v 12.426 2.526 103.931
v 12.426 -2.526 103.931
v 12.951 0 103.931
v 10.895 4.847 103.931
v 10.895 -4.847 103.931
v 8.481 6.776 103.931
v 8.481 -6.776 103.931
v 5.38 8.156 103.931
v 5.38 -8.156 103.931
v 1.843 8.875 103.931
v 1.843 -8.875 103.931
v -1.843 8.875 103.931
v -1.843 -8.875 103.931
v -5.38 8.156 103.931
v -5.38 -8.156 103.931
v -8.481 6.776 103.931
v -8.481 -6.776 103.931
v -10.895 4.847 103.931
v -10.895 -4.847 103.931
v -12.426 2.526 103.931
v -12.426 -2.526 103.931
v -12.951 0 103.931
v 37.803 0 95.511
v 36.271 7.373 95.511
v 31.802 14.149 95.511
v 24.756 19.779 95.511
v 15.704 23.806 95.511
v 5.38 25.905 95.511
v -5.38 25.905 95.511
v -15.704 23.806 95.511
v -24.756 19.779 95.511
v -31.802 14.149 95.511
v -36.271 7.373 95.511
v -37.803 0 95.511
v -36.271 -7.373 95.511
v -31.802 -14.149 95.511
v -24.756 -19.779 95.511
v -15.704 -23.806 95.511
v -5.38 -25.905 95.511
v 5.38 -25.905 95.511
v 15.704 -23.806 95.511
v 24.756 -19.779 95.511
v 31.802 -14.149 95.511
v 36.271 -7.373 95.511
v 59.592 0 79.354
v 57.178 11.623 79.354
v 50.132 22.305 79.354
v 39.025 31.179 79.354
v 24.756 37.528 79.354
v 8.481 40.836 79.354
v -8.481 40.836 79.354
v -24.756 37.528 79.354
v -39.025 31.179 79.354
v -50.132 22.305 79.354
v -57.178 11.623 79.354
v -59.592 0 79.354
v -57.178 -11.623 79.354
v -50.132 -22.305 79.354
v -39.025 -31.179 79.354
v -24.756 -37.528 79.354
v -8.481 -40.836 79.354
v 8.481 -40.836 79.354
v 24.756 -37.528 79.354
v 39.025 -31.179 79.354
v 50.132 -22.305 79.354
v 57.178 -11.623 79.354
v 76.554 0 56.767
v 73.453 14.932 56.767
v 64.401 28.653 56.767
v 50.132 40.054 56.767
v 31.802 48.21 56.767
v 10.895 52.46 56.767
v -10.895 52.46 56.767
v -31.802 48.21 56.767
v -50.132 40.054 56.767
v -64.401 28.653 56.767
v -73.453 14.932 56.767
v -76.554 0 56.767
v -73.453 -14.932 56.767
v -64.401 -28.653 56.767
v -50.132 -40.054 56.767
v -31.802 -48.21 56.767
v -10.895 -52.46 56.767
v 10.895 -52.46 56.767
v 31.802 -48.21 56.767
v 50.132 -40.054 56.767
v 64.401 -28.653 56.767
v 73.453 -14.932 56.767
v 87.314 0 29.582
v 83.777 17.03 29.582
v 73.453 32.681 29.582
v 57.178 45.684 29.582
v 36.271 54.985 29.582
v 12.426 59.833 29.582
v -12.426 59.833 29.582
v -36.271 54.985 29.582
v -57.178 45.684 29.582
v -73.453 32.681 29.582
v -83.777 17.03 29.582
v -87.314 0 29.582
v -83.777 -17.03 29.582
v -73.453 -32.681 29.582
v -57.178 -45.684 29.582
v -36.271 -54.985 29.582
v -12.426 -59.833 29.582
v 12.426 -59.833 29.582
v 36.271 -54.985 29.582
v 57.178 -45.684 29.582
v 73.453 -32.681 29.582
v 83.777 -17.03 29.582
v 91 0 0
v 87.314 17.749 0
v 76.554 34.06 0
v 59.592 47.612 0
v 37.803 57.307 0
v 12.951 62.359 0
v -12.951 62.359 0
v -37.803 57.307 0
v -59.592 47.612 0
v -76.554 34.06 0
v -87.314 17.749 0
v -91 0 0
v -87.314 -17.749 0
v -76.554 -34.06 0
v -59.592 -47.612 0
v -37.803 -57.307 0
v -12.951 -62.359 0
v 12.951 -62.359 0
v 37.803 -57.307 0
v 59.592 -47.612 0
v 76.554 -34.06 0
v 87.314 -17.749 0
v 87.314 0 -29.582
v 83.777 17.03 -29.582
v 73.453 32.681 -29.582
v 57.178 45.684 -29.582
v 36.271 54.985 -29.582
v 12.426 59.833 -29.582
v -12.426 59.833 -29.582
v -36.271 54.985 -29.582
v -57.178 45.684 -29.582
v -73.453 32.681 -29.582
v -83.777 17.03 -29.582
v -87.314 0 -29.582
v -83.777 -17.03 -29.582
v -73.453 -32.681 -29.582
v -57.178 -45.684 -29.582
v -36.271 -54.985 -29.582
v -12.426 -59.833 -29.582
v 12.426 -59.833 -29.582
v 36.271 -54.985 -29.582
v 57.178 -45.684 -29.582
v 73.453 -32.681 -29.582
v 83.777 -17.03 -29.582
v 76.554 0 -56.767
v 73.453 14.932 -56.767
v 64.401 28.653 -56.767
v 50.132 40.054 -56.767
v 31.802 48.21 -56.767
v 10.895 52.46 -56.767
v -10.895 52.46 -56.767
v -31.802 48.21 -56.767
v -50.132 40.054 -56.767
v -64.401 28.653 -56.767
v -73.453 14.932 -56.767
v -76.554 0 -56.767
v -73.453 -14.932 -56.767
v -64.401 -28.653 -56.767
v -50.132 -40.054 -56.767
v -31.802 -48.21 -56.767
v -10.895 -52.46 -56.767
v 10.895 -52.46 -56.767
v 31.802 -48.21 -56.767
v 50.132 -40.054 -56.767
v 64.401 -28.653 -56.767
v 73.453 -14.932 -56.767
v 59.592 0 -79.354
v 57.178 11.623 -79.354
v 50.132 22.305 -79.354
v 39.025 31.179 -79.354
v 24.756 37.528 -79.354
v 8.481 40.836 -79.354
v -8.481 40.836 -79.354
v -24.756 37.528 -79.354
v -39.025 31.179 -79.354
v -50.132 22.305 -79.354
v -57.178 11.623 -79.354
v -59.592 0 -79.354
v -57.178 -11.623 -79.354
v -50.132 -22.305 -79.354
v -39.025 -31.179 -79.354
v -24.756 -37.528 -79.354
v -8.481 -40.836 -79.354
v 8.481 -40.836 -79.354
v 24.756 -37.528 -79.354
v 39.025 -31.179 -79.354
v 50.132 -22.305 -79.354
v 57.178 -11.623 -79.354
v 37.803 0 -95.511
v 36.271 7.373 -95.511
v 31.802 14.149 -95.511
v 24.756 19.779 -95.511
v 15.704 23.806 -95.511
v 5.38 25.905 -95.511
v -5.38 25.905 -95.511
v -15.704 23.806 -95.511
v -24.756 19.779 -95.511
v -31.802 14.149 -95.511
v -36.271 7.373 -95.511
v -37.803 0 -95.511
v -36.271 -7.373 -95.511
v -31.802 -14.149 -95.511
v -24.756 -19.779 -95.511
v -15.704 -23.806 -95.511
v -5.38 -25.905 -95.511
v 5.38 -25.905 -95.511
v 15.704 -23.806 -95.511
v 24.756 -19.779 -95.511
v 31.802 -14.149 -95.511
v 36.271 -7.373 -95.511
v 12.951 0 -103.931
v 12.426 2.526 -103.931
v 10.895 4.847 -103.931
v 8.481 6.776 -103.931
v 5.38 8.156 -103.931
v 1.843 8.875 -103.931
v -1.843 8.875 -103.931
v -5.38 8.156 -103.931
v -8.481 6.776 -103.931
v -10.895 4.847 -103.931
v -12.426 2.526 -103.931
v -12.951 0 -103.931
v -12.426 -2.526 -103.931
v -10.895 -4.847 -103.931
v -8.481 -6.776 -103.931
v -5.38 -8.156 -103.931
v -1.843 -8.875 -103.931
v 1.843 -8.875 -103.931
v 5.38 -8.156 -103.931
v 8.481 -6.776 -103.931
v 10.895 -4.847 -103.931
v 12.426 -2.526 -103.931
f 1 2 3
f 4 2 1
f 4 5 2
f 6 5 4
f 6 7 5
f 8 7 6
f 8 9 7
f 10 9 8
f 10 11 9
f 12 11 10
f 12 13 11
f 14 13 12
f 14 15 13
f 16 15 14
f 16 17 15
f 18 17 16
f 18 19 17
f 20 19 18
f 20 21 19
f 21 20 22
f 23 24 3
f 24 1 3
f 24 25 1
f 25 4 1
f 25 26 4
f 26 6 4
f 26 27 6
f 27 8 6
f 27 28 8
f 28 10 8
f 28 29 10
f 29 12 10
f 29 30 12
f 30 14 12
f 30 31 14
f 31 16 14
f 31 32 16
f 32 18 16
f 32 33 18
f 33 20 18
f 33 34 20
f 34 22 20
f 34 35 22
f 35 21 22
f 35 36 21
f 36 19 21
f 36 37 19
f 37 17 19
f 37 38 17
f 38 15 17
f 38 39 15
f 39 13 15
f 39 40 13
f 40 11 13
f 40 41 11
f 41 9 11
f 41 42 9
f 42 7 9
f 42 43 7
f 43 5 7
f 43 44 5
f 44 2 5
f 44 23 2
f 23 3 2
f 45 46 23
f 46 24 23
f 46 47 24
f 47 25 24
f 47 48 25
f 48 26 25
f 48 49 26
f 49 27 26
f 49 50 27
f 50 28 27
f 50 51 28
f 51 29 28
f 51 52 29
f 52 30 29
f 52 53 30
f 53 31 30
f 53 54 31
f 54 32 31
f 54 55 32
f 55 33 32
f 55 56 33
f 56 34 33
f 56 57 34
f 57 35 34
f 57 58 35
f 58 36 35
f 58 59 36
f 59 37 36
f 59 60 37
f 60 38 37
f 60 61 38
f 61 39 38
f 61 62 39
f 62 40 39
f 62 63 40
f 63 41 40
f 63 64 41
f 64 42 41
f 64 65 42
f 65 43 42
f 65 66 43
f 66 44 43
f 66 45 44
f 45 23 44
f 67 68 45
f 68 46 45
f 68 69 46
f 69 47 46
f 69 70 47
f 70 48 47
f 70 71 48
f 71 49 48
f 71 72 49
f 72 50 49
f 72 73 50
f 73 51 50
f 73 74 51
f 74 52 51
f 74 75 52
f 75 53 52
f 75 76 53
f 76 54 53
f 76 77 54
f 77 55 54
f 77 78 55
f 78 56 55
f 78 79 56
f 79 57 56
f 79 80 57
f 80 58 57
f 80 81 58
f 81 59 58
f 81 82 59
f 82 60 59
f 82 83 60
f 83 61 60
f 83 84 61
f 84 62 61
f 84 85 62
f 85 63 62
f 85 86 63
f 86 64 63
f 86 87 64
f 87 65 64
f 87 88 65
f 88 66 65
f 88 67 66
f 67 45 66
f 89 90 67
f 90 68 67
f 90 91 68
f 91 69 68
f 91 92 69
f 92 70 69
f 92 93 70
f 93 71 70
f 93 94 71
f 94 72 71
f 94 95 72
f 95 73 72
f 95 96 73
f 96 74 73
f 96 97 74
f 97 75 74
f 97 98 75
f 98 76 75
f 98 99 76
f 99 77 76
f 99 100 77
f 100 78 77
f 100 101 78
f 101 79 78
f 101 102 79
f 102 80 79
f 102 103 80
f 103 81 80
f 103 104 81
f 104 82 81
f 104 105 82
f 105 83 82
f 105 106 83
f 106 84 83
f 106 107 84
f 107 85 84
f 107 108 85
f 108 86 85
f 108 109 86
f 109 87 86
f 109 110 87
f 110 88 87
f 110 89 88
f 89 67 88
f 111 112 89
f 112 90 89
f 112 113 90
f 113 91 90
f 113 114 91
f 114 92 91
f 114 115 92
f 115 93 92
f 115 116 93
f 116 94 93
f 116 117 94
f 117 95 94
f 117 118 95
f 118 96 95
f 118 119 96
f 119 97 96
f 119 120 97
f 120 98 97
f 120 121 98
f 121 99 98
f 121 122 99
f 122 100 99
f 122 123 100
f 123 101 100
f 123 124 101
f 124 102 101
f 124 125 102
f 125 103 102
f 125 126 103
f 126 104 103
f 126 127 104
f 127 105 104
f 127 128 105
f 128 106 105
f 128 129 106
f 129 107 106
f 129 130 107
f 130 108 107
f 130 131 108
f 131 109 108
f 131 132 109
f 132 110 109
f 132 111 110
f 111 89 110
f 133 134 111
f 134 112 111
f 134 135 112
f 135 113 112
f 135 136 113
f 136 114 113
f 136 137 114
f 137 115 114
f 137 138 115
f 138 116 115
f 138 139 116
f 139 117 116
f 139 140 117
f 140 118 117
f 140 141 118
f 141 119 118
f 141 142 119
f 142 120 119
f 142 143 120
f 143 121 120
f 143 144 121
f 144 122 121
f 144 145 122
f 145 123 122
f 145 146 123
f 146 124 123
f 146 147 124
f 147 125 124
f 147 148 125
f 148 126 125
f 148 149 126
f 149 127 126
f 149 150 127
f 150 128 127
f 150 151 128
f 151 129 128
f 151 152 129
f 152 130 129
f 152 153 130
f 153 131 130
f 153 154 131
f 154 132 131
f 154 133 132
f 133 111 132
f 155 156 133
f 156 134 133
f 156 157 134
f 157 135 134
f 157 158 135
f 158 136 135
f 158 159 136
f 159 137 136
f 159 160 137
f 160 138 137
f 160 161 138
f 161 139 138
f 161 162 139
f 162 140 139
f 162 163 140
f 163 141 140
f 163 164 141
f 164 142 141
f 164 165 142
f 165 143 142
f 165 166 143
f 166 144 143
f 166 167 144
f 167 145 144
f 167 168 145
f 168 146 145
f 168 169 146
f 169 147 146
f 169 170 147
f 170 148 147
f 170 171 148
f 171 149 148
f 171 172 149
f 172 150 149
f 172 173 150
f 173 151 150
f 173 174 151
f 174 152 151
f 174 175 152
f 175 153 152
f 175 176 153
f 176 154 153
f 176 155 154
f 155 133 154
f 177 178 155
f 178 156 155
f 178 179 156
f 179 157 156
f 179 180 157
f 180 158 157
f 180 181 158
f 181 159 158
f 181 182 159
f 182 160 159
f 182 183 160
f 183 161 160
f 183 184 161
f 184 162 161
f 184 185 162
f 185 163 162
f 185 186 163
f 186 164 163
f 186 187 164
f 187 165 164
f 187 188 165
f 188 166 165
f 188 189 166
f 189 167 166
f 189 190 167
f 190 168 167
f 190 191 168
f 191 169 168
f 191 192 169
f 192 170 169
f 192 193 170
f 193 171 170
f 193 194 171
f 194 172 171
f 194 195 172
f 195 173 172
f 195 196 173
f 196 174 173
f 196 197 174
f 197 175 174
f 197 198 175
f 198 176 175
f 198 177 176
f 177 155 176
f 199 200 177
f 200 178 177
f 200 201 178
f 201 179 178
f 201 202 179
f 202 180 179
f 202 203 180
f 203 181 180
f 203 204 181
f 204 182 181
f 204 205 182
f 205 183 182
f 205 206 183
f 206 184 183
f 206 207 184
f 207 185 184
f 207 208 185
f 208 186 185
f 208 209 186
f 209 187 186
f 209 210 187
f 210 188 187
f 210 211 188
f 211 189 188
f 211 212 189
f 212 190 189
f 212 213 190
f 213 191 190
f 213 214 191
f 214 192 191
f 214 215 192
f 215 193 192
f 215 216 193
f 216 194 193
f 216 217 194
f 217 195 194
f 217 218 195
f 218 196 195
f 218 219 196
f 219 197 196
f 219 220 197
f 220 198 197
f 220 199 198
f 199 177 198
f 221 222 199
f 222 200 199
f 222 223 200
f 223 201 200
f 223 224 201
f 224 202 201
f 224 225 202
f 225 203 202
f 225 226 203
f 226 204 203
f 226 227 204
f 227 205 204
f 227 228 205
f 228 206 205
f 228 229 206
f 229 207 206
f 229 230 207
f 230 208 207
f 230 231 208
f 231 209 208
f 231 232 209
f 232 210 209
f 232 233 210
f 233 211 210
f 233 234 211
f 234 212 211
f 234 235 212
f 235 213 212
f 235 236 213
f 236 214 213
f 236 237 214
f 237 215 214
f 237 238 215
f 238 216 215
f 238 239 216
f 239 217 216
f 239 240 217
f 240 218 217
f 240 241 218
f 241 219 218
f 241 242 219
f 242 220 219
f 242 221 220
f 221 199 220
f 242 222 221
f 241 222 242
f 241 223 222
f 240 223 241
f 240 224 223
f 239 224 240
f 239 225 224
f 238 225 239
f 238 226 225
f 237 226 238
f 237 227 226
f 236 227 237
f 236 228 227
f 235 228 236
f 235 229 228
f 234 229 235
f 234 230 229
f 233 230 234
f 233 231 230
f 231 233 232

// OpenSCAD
// Generated by SolidPython 1.0.1 on 2020-07-29 00:46:50


scale(v = [13, 9, 15]) {
	sphere(r = 7);
}
/***********************************************
*********      SolidPython code:      **********
************************************************
 
# import packages: SolidPython
from solid import *
from solid.utils import *
from itertools import chain, combinations, permutations


class Resize:

    def __init__(self, scad_file):
        self.scad_file = scad_file
        #self.scad_file = import_scad(scad_file)
        # cone/cylinder param:
        self.r1 = 0
        self.r2 = 0
        self.h = 0
        # rectangular prism param:
        self.w = 0
        self.l = 0
        # ellipse param:
        self.r = 0

    # import OpenScad code (file name corresponds to shape)


    # classify shape + parameters
    def assign(self, param1, param2, param3):
        if self.scad_file == 'cone.scad':
            self.r1 = param1
            self.r2 = param2
            self.h = param3
        elif self.scad_file == 'cylinder.scad':
            self.r1 = param1
            self.r2 = param2
            self.h = param3
        elif self.scad_file == 'rectangularPrism.scad':
            self.h = param1
            self.l = param2
            self.w = param3
        else:
            self.r = param1
            self.h = param2

    # resize parameters
    def iterate(self):
        x = range(3, 20, 2)
        i = 1
        if self.scad_file == 'cone.scad':
            tempList = list(permutations(x, 2))
            for temp in tempList:
                param1 = temp[0]
                param2 = temp[1]
                filepath = 'produced_scad_files/' + 'cone' + str(param1) + '_' + str(param2) + '_' + '.scad'
                scad_render_to_file(cylinder(h=param1, r1=param2, r2=0), filepath)

        elif self.scad_file == 'cylinder.scad':
            tempList = list(permutations(x, 3))
            for temp in tempList:
                param1 = temp[0]
                param2 = temp[1]
                filepath = 'produced_scad_files/' + 'cylinder' + str(param1) + '_' + str(param2) + '_' + '.scad'
                scad_render_to_file(cylinder(h=param1, r1=param2, r2=param2), filepath)

        elif self.scad_file == 'rectangularPrism.scad':
            tempList = list(permutations(x, 3))
            for temp in tempList:
                param1 = temp[0]
                param2 = temp[1]
                param3 = temp[2]
                filepath = 'produced_scad_files/' + 'rectangularPrism' + str(param1) + '_' + str(param2) + '_' + str(
                    param3) + '.scad'
                scad_render_to_file(cube(size=(param1, param2, param3)), filepath)

        elif self.scad_file == 'ellipse.scad':
            tempList = list(permutations(x, 4))
            for temp in tempList:
                param1 = temp[0]
                param2 = temp[1]
                param3 = temp[2]
                param4 = temp[3]
                filepath = 'produced_scad_files/' + 'ellipse' + str(param1) + '_' + str(param2) + '_' + str(param3) + '_' + str(param4) + '.scad'
                scad_render_to_file(scale([param1, param2, param3])(sphere(r=param4)), filepath)

    def render_to_scadfile(self):
        scad_render_to_file(scad, 'example.scad') 
 
************************************************/
